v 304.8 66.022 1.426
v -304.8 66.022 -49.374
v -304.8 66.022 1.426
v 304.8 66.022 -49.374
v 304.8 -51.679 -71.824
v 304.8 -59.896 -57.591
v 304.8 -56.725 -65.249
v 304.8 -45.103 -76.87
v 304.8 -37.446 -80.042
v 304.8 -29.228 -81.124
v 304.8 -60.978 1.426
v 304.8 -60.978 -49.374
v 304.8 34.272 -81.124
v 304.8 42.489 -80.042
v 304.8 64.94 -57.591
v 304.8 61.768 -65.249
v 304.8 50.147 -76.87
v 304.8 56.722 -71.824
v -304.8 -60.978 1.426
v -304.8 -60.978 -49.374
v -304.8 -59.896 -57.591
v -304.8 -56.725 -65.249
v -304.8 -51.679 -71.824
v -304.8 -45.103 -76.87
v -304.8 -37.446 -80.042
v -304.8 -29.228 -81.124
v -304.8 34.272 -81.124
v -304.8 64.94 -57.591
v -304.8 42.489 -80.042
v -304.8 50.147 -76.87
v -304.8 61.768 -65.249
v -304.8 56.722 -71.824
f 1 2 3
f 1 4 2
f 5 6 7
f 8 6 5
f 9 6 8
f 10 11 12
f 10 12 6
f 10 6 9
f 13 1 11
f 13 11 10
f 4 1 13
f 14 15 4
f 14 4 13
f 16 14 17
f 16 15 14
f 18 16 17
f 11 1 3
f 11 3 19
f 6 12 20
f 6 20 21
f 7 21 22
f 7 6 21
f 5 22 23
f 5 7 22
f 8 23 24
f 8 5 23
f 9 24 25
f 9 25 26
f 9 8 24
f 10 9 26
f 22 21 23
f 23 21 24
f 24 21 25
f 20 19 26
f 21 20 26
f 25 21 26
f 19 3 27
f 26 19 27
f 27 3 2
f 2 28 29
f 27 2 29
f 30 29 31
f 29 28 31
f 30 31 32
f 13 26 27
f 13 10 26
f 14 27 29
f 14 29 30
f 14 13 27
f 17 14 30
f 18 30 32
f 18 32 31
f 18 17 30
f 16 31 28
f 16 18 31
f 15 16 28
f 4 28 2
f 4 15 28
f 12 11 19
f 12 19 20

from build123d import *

# Parameters (mm, degrees)
BOSS_EXTRUDE1_DEPTH = 304.8


with BuildPart() as part:
    # Sketch1 → Boss-Extrude1 (new, symmetric)
    with BuildSketch(Plane(origin=(0, 0, 0), x_dir=(0, 0, -1), z_dir=(1, 0, 0))):
        with BuildLine():
            Line((49.373646209, 66.02166065), (-1.426353791, 66.02166065))
            Line((-1.426353791, 66.02166065), (-1.426353791, -60.97833935))
            Line((-1.426353791, -60.97833935), (49.373646209, -60.97833935))
            ThreePointArc((49.373646209, -60.97833935), (71.824286512, -51.678979653), (81.123646209, -29.22833935))
            Line((81.123646209, -29.22833935), (81.123646209, 34.27166065))
            ThreePointArc((81.123646209, 34.27166065), (71.824286512, 56.722300952), (49.373646209, 66.02166065))
        make_face()
    extrude(amount=BOSS_EXTRUDE1_DEPTH, both=True)


solid = part.part
